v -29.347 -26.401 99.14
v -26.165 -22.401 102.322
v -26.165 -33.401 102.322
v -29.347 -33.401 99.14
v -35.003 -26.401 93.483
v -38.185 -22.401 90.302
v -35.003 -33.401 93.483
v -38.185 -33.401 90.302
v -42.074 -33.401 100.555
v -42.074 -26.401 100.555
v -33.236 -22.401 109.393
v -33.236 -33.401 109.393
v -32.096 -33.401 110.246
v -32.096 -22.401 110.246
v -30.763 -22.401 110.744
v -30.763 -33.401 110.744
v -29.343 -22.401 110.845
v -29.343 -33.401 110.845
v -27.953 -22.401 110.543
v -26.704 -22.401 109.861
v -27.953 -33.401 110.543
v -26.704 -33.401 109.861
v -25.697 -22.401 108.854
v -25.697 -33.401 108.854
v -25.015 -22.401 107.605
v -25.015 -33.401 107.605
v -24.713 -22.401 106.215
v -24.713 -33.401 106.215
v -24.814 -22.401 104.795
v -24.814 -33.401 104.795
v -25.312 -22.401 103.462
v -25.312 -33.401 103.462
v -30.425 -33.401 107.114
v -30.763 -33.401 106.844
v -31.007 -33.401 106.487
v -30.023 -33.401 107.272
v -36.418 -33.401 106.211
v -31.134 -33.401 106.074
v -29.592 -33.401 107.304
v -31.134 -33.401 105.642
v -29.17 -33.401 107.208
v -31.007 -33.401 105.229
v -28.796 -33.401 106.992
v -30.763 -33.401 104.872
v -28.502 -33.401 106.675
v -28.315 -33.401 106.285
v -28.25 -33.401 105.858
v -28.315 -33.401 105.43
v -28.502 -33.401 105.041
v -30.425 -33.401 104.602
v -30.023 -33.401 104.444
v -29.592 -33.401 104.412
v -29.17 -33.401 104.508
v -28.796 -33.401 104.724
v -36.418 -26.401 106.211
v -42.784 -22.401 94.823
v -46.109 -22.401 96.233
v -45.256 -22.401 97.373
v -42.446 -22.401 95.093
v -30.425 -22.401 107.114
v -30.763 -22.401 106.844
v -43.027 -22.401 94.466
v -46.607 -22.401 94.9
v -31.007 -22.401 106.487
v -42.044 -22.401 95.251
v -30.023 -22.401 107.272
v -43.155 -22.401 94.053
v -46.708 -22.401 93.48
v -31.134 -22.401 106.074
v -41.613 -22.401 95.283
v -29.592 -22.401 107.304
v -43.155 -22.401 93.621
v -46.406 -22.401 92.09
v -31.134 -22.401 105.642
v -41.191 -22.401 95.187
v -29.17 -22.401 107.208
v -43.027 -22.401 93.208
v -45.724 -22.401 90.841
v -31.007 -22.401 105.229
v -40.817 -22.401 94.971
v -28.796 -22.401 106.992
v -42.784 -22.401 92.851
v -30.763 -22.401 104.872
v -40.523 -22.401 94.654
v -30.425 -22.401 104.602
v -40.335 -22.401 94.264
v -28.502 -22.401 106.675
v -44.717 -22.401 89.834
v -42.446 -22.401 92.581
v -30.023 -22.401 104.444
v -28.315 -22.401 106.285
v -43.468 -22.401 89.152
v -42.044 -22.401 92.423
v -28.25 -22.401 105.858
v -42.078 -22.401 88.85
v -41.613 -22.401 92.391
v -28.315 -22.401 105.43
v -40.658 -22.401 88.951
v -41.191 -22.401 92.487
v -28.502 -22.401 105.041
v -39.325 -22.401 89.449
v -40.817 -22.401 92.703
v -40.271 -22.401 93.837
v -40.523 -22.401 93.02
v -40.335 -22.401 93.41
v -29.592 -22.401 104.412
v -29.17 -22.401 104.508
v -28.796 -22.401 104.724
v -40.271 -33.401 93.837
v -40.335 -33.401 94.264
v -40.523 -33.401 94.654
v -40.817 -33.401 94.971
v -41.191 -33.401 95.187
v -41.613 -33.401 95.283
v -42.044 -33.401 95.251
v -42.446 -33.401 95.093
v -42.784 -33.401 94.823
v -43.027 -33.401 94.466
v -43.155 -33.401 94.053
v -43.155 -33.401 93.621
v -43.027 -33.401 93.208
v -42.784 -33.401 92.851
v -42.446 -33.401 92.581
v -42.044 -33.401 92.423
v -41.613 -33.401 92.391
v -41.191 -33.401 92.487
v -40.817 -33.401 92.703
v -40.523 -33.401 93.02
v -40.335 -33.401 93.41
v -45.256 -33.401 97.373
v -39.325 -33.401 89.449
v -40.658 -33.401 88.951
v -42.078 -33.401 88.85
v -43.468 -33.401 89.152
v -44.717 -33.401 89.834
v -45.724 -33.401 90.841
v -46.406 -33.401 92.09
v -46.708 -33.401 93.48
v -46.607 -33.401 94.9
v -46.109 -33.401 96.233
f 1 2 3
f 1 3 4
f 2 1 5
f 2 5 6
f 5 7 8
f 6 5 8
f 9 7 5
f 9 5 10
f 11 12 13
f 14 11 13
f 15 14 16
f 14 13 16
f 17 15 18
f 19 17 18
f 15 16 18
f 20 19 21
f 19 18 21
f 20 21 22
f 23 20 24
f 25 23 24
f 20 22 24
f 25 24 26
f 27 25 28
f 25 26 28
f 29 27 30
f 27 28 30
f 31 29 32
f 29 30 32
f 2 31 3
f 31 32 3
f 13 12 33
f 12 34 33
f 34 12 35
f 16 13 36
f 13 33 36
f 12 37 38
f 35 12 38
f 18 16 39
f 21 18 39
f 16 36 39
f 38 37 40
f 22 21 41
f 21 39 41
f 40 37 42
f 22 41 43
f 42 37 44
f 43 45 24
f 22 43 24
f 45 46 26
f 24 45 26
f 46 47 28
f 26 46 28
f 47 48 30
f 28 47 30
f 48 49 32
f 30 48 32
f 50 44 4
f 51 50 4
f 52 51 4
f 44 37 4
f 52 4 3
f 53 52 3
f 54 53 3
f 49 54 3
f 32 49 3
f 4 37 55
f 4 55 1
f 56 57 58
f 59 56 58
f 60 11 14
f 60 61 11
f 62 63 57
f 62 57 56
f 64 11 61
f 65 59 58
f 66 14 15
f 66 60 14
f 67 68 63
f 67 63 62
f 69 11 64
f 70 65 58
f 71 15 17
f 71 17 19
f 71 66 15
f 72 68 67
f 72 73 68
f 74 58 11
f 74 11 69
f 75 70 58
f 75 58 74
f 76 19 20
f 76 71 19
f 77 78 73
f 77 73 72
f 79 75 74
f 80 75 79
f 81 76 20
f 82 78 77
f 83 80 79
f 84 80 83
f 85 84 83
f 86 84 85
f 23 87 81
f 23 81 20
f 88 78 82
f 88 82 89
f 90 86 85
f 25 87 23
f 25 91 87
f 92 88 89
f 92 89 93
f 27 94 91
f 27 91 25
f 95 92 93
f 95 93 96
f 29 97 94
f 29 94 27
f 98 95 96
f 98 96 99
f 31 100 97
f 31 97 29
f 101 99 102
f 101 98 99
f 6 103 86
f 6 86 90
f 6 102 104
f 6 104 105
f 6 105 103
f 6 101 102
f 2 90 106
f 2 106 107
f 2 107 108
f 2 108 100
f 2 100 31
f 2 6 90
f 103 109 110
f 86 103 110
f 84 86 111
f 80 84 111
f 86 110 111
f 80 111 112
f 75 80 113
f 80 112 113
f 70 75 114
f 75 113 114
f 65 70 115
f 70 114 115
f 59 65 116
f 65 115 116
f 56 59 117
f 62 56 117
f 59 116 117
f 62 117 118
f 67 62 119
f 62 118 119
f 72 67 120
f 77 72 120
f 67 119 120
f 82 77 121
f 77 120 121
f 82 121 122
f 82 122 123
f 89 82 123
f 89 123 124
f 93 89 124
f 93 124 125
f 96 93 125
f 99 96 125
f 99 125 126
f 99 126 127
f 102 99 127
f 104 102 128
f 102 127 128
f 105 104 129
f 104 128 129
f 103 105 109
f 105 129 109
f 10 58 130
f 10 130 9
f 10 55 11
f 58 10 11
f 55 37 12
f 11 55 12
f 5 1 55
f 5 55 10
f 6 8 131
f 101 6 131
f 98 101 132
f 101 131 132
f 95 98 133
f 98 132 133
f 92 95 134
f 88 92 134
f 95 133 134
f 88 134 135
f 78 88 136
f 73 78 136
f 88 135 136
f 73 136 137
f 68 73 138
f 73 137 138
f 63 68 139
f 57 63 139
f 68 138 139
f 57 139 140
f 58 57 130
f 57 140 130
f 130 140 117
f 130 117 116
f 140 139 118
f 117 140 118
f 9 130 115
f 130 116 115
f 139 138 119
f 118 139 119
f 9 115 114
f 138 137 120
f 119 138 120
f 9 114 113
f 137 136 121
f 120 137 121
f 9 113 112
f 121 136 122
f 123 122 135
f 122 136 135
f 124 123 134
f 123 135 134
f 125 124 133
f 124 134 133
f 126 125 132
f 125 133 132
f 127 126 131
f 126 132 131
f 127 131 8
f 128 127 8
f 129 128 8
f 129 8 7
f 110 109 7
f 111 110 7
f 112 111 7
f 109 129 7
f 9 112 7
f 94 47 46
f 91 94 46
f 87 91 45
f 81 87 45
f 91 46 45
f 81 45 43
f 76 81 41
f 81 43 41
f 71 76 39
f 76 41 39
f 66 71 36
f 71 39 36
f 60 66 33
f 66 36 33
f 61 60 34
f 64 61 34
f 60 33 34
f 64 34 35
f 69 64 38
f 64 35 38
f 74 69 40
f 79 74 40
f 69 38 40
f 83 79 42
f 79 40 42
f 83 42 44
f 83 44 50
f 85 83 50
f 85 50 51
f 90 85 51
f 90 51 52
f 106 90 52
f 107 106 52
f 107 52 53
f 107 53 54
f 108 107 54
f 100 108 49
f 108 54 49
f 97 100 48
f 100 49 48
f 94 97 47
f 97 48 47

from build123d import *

# Parameters (mm, degrees)
SALIENTE_EXTRUIR1_DEPTH = 11
CROQUIS2_R              = 1.45
CORTAR_EXTRUIR1_DEPTH   = 11
CORTAR_EXTRUIR2_DEPTH   = 7


with BuildPart() as part:
    # Croquis1 → Saliente-Extruir1 (new body)
    with BuildSketch(Plane(origin=(0, -33.400588291, 0), x_dir=(1, 0, 0), z_dir=(0, 1, 0))):
        with BuildLine():
            Line((-45.256444502, -97.372583002), (-33.235629222, -109.393398282))
            ThreePointArc((-33.235629222, -109.393398282), (-26.16456141, -109.393398282), (-26.16456141, -102.32233047))
            Line((-26.16456141, -102.32233047), (-38.18537669, -90.30151519))
            ThreePointArc((-38.18537669, -90.30151519), (-45.256444502, -90.30151519), (-45.256444502, -97.372583002))
        make_face()
    extrude(amount=SALIENTE_EXTRUIR1_DEPTH)

    # Croquis2 → Cortar-Extruir1 (cut)
    with BuildSketch(Plane.XZ.offset(33.400588291)):
        with Locations((-41.720910596, 93.837049096)):
            Circle(CROQUIS2_R)
        with Locations((-29.700095316, 105.857864376)):
            Circle(CROQUIS2_R)
    extrude(amount=-CORTAR_EXTRUIR1_DEPTH, mode=Mode.SUBTRACT)

    # Croquis3 → Cortar-Extruir2 (cut)
    with BuildSketch(Plane.XZ.offset(33.400588291)):
        Polygon((-40.24952431, 104.38647809), (-37.421097185, 107.214905215), (-26.82292811, 96.61673614), (-32.47978236, 90.95988189), (-43.077951435, 101.558050965), align=None)
    extrude(amount=-CORTAR_EXTRUIR2_DEPTH, mode=Mode.SUBTRACT)


solid = part.part
